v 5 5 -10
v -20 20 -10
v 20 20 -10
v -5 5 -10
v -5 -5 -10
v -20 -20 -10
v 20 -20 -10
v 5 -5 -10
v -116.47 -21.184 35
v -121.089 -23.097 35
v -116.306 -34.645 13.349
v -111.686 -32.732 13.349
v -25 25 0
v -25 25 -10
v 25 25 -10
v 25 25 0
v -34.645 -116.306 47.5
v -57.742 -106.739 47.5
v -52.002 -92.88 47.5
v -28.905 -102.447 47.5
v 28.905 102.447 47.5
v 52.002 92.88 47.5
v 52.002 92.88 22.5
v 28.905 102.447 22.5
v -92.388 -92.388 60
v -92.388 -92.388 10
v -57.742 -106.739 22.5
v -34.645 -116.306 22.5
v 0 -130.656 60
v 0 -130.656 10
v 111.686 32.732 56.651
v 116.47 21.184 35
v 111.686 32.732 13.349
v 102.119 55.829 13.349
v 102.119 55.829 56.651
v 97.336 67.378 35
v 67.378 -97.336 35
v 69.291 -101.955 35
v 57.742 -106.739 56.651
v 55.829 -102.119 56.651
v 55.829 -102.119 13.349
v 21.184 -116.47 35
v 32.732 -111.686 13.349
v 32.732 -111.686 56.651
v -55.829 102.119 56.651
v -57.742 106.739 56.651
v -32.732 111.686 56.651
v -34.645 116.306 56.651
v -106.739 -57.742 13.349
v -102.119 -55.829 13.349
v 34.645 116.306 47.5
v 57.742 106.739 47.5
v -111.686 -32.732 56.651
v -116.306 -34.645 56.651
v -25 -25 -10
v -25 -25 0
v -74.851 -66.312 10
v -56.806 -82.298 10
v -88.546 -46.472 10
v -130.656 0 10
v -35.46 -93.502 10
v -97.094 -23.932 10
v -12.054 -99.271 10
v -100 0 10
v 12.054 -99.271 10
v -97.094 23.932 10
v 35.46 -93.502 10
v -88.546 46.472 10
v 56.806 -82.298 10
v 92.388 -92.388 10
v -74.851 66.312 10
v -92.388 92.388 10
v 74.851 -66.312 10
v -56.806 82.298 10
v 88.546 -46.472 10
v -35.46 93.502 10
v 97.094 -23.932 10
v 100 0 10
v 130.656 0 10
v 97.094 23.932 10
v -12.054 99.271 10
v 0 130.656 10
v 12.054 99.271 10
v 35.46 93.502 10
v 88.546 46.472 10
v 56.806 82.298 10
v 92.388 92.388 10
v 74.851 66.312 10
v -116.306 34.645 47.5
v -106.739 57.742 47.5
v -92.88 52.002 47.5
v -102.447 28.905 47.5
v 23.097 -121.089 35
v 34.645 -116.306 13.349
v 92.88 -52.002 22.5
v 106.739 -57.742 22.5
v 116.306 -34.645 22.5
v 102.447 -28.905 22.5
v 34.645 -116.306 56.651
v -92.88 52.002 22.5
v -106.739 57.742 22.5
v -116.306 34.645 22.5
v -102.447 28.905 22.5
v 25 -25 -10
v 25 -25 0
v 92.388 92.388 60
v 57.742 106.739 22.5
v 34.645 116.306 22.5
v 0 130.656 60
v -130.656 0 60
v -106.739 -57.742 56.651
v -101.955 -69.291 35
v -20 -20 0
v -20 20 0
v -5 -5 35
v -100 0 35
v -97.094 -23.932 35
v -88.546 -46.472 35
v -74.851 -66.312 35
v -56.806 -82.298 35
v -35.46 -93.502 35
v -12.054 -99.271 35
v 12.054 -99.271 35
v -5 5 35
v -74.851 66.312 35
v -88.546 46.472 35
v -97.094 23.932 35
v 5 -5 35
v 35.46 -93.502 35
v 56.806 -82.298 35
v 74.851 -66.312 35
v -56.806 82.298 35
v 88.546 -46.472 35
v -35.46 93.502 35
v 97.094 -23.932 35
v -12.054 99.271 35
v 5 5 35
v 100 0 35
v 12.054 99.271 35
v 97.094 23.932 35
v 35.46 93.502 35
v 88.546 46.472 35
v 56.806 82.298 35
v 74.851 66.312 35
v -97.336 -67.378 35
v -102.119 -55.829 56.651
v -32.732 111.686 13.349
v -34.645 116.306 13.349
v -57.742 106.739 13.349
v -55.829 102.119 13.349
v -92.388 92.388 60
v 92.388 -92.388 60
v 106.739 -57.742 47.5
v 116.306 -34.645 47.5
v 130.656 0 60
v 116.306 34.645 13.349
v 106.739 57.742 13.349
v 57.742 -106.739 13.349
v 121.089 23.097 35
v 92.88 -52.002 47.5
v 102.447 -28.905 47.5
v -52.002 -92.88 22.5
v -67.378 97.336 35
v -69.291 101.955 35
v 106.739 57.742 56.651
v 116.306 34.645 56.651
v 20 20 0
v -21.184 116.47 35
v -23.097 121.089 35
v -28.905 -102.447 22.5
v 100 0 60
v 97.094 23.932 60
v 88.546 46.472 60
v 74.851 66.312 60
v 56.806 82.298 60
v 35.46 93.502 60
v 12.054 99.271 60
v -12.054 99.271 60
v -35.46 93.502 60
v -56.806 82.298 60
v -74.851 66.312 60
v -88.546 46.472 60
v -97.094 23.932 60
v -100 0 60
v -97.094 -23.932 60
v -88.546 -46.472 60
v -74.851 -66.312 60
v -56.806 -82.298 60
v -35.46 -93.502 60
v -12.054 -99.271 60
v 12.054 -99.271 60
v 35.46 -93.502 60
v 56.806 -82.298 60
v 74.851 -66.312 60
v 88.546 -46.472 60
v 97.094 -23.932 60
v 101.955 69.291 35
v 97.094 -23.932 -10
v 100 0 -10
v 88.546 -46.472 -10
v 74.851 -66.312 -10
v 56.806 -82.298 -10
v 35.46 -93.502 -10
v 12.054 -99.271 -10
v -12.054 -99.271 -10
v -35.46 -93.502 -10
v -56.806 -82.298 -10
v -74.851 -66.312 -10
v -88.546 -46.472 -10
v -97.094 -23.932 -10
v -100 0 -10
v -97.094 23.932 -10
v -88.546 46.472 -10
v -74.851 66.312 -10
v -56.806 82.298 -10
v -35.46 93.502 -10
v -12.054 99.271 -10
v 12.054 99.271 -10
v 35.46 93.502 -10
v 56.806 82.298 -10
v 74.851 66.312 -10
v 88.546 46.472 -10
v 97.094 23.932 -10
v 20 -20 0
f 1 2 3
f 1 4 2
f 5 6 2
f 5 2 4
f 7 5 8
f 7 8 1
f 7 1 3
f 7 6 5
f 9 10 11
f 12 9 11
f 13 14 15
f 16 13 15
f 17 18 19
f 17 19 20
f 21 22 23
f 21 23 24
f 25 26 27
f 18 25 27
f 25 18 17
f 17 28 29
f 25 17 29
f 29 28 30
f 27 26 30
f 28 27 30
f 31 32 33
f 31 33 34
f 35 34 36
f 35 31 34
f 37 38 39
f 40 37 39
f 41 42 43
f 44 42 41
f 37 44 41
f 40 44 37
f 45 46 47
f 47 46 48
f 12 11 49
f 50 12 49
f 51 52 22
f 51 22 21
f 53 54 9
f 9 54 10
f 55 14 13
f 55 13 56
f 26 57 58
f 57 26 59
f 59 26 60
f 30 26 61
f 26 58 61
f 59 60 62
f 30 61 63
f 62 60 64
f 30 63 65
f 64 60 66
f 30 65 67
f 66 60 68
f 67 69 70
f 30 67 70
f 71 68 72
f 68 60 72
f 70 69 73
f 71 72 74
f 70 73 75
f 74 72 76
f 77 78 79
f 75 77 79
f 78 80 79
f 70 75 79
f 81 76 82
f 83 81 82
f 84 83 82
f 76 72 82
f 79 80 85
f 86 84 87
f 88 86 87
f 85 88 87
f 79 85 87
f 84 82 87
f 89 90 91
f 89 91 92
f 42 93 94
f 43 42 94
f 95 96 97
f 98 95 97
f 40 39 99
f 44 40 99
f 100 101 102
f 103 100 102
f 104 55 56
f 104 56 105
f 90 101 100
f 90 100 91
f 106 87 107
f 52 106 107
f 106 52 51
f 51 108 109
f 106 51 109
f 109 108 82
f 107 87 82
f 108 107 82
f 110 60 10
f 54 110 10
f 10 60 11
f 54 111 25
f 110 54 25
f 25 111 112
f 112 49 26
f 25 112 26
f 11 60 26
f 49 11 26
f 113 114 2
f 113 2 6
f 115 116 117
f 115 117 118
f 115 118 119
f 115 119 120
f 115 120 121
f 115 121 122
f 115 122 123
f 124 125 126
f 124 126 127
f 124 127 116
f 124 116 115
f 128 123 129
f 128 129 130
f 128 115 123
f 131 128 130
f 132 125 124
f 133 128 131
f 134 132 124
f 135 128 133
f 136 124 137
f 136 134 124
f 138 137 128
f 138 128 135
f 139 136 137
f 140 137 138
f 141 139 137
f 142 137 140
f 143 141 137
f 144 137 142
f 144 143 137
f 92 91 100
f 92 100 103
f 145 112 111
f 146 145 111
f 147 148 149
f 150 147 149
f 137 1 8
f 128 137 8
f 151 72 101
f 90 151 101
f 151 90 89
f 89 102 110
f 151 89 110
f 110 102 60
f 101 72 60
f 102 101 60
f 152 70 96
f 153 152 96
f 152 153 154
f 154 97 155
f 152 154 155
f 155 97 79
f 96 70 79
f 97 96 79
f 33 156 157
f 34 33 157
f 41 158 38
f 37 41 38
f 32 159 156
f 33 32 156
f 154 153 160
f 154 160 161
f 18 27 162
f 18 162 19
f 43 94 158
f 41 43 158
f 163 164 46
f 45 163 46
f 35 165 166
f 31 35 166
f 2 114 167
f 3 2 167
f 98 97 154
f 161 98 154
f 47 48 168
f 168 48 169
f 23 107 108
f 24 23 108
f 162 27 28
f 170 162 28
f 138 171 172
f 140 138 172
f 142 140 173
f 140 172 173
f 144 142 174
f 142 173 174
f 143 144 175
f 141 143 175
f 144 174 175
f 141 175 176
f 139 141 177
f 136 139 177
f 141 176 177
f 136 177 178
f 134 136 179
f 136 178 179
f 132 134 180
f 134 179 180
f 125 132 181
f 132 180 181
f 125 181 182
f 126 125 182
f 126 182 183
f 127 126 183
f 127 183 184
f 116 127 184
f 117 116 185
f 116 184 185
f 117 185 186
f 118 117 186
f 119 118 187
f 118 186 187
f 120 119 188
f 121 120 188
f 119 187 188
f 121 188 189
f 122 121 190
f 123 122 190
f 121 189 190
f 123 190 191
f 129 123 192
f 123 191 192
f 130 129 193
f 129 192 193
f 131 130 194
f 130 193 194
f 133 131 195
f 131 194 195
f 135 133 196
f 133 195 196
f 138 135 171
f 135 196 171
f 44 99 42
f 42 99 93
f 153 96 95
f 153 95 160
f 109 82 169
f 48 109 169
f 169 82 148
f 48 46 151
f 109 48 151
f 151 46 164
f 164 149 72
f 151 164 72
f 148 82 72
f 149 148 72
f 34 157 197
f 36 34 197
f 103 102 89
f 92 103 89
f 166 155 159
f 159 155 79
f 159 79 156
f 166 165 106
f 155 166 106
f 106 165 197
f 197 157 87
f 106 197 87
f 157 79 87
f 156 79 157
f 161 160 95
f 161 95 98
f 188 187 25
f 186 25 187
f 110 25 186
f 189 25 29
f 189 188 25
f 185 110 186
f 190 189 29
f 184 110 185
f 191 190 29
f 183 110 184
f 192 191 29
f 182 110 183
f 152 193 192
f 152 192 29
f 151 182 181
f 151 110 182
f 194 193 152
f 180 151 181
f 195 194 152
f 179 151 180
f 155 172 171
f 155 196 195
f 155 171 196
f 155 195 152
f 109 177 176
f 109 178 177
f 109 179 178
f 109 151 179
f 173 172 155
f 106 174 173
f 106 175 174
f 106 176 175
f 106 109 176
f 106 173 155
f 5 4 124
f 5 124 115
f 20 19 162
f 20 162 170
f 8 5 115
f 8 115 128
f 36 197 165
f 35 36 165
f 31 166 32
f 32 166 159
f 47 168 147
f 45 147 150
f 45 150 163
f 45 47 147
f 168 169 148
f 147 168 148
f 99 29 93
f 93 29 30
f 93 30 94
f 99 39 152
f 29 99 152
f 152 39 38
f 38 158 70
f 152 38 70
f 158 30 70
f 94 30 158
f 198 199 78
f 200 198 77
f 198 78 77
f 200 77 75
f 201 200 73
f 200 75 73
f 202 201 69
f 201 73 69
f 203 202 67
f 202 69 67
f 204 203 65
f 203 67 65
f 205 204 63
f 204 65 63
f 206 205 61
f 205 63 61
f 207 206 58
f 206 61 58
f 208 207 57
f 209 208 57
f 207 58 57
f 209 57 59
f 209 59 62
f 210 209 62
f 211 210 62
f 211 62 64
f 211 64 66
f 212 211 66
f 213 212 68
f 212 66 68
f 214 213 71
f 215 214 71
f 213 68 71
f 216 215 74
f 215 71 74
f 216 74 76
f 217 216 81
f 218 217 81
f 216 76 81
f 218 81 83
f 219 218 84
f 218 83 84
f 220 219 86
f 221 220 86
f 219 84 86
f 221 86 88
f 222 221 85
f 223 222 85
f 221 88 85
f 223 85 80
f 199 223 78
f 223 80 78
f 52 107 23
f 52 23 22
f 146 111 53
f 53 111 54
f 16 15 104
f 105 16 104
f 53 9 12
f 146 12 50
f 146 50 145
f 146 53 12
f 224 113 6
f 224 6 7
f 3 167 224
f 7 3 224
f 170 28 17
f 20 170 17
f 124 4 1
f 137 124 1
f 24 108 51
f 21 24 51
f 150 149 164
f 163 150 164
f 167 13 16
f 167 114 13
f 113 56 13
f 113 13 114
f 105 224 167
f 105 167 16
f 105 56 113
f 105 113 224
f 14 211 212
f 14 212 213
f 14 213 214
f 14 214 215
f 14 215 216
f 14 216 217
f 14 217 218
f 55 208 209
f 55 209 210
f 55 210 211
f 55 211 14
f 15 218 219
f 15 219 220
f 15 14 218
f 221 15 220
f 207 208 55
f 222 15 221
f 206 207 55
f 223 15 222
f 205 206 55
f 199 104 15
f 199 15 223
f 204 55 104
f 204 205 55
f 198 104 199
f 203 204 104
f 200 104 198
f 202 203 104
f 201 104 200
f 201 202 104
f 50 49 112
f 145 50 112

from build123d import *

# Parameters (mm, degrees)
F1_DEPTH  = 50
F2_W      = 25
F2_H      = 25
F3_DEPTH  = 15
F4_W      = 25
F4_H      = 25
F5_DEPTH  = 15
F6_W      = 25
F6_H      = 25
F7_DEPTH  = 15
F8_W      = 25
F8_H      = 25
F9_DEPTH  = 15
F11_DEPTH = 5
F13_DEPTH = 5
F15_DEPTH = 5
F17_DEPTH = 5
F18_R     = 100
F19_DEPTH = 25
F20_R     = 100
F21_DEPTH = 20
F23_W     = 50
F23_H     = 50
F24_DEPTH = 10
F25_W     = 40
F25_H     = 40
F26_DEPTH = 10
F27_W     = 10
F27_H     = 10
F28_DEPTH = 45


with BuildPart() as f1:
    # F0 (on Top) → F1 (new body)
    with BuildSketch(Plane.XY):
        Polygon((-92.3879532511, -92.3879532511), (0, -130.6562964876), (92.3879532511, -92.3879532511), (130.6562964876, 0), (92.3879532511, 92.3879532511), (0, 130.6562964876), (-92.3879532511, 92.3879532511), (-130.6562964876, 0), align=None)
    extrude(amount=F1_DEPTH)

    # F2 (on face) → F3 (cut)
    with BuildSketch(Plane(origin=(-46.1939766256, -111.5221248694, 0), x_dir=(0.9238795325, -0.3826834324, 0), z_dir=(-0.3826834324, -0.9238795325, 0))):
        with Locations((0, 25)):
            Rectangle(F2_W, F2_H)
    extrude(amount=-F3_DEPTH, mode=Mode.SUBTRACT)

    # F4 (on face) → F5 (cut)
    with BuildSketch(Plane(origin=(-111.5221248694, 46.1939766256, 0), x_dir=(-0.3826834324, -0.9238795325, 0), z_dir=(-0.9238795325, 0.3826834324, 0))):
        with Locations((0, 25)):
            Rectangle(F4_W, F4_H)
    extrude(amount=-F5_DEPTH, mode=Mode.SUBTRACT)

    # F6 (on face) → F7 (cut)
    with BuildSketch(Plane(origin=(46.1939766256, 111.5221248694, 0), x_dir=(-0.9238795325, 0.3826834324, 0), z_dir=(0.3826834324, 0.9238795325, 0))):
        with Locations((0, 25)):
            Rectangle(F6_W, F6_H)
    extrude(amount=-F7_DEPTH, mode=Mode.SUBTRACT)

    # F8 (on face) → F9 (cut)
    with BuildSketch(Plane(origin=(111.5221248694, -46.1939766256, 0), x_dir=(0.3826834324, 0.9238795325, 0), z_dir=(0.9238795325, -0.3826834324, 0))):
        with Locations((0, 25)):
            Rectangle(F8_W, F8_H)
    extrude(amount=-F9_DEPTH, mode=Mode.SUBTRACT)

    # F10 (on face) → F11 (cut)
    with BuildSketch(Plane(origin=(46.1939766256, -111.5221248694, 0), x_dir=(0.9238795325, 0.3826834324, 0), z_dir=(0.3826834324, -0.9238795325, 0))):
        Polygon((12.4999989995, 3.3493643278), (25, 24.9999988448), (12.5000010005, 46.650634517), (-12.4999989995, 46.6506356722), (-25, 25.0000011552), (-12.5000010005, 3.349365483), align=None)
    extrude(amount=-F11_DEPTH, mode=Mode.SUBTRACT)

    # F12 (on face) → F13 (cut)
    with BuildSketch(Plane(origin=(111.5221248694, 46.1939766256, 0), x_dir=(-0.3826834324, 0.9238795325, 0), z_dir=(0.9238795325, 0.3826834324, 0))):
        Polygon((12.4999987427, 3.3493641795), (25, 24.9999985481), (12.5000012573, 46.6506343687), (-12.4999987427, 46.6506358205), (-25, 25.0000014519), (-12.5000012573, 3.3493656313), align=None)
    extrude(amount=-F13_DEPTH, mode=Mode.SUBTRACT)

    # F14 (on face) → F15 (cut)
    with BuildSketch(Plane(origin=(-111.5221248694, -46.1939766256, 0), x_dir=(0.3826834324, -0.9238795325, 0), z_dir=(-0.9238795325, -0.3826834324, 0))):
        Polygon((12.5, 46.6506350946), (-12.5, 46.6506350946), (-25, 25), (-12.5, 3.3493649054), (12.5, 3.3493649054), (25, 25), align=None)
    extrude(amount=-F15_DEPTH, mode=Mode.SUBTRACT)

    # F16 (on face) → F17 (cut)
    with BuildSketch(Plane(origin=(-46.1939766256, 111.5221248694, 0), x_dir=(-0.9238795325, -0.3826834324, 0), z_dir=(-0.3826834324, 0.9238795325, 0))):
        Polygon((12.5, 46.6506350946), (-12.5, 46.6506350946), (-25, 25), (-12.5, 3.3493649054), (12.5, 3.3493649054), (25, 25), align=None)
    extrude(amount=-F17_DEPTH, mode=Mode.SUBTRACT)

    # F18 (on face) → F19 (cut)
    with BuildSketch(Plane.XY.offset(50)):
        Circle(F18_R)
    extrude(amount=-F19_DEPTH, mode=Mode.SUBTRACT)

    # F20 (on face) → F21 (join)
    with BuildSketch(Plane(origin=(0, 0, 0), x_dir=(1, 0, 0), z_dir=(0, 0, -1))):
        Circle(F20_R)
    extrude(amount=F21_DEPTH)


with BuildPart() as f1_1:
    # F22: moved
    add(f1.part.moved(Location((0, 0, 10))))

    # F23 (on face) → F24 (cut)
    with BuildSketch(Plane(origin=(0, 0, -10), x_dir=(1, 0, 0), z_dir=(0, 0, -1))):
        Rectangle(F23_W, F23_H)
    extrude(amount=-F24_DEPTH, mode=Mode.SUBTRACT)

    # F25 (on face) → F26 (join)
    with BuildSketch(Plane(origin=(0, 0, 0), x_dir=(1, 0, 0), z_dir=(0, 0, -1))):
        Rectangle(F25_W, F25_H)
    extrude(amount=F26_DEPTH)

    # F27 (on face) → F28 (cut)
    with BuildSketch(Plane(origin=(0, 0, -10), x_dir=(1, 0, 0), z_dir=(0, 0, -1))):
        Rectangle(F27_W, F27_H)
    extrude(amount=-F28_DEPTH, mode=Mode.SUBTRACT)


solid = f1_1.part
